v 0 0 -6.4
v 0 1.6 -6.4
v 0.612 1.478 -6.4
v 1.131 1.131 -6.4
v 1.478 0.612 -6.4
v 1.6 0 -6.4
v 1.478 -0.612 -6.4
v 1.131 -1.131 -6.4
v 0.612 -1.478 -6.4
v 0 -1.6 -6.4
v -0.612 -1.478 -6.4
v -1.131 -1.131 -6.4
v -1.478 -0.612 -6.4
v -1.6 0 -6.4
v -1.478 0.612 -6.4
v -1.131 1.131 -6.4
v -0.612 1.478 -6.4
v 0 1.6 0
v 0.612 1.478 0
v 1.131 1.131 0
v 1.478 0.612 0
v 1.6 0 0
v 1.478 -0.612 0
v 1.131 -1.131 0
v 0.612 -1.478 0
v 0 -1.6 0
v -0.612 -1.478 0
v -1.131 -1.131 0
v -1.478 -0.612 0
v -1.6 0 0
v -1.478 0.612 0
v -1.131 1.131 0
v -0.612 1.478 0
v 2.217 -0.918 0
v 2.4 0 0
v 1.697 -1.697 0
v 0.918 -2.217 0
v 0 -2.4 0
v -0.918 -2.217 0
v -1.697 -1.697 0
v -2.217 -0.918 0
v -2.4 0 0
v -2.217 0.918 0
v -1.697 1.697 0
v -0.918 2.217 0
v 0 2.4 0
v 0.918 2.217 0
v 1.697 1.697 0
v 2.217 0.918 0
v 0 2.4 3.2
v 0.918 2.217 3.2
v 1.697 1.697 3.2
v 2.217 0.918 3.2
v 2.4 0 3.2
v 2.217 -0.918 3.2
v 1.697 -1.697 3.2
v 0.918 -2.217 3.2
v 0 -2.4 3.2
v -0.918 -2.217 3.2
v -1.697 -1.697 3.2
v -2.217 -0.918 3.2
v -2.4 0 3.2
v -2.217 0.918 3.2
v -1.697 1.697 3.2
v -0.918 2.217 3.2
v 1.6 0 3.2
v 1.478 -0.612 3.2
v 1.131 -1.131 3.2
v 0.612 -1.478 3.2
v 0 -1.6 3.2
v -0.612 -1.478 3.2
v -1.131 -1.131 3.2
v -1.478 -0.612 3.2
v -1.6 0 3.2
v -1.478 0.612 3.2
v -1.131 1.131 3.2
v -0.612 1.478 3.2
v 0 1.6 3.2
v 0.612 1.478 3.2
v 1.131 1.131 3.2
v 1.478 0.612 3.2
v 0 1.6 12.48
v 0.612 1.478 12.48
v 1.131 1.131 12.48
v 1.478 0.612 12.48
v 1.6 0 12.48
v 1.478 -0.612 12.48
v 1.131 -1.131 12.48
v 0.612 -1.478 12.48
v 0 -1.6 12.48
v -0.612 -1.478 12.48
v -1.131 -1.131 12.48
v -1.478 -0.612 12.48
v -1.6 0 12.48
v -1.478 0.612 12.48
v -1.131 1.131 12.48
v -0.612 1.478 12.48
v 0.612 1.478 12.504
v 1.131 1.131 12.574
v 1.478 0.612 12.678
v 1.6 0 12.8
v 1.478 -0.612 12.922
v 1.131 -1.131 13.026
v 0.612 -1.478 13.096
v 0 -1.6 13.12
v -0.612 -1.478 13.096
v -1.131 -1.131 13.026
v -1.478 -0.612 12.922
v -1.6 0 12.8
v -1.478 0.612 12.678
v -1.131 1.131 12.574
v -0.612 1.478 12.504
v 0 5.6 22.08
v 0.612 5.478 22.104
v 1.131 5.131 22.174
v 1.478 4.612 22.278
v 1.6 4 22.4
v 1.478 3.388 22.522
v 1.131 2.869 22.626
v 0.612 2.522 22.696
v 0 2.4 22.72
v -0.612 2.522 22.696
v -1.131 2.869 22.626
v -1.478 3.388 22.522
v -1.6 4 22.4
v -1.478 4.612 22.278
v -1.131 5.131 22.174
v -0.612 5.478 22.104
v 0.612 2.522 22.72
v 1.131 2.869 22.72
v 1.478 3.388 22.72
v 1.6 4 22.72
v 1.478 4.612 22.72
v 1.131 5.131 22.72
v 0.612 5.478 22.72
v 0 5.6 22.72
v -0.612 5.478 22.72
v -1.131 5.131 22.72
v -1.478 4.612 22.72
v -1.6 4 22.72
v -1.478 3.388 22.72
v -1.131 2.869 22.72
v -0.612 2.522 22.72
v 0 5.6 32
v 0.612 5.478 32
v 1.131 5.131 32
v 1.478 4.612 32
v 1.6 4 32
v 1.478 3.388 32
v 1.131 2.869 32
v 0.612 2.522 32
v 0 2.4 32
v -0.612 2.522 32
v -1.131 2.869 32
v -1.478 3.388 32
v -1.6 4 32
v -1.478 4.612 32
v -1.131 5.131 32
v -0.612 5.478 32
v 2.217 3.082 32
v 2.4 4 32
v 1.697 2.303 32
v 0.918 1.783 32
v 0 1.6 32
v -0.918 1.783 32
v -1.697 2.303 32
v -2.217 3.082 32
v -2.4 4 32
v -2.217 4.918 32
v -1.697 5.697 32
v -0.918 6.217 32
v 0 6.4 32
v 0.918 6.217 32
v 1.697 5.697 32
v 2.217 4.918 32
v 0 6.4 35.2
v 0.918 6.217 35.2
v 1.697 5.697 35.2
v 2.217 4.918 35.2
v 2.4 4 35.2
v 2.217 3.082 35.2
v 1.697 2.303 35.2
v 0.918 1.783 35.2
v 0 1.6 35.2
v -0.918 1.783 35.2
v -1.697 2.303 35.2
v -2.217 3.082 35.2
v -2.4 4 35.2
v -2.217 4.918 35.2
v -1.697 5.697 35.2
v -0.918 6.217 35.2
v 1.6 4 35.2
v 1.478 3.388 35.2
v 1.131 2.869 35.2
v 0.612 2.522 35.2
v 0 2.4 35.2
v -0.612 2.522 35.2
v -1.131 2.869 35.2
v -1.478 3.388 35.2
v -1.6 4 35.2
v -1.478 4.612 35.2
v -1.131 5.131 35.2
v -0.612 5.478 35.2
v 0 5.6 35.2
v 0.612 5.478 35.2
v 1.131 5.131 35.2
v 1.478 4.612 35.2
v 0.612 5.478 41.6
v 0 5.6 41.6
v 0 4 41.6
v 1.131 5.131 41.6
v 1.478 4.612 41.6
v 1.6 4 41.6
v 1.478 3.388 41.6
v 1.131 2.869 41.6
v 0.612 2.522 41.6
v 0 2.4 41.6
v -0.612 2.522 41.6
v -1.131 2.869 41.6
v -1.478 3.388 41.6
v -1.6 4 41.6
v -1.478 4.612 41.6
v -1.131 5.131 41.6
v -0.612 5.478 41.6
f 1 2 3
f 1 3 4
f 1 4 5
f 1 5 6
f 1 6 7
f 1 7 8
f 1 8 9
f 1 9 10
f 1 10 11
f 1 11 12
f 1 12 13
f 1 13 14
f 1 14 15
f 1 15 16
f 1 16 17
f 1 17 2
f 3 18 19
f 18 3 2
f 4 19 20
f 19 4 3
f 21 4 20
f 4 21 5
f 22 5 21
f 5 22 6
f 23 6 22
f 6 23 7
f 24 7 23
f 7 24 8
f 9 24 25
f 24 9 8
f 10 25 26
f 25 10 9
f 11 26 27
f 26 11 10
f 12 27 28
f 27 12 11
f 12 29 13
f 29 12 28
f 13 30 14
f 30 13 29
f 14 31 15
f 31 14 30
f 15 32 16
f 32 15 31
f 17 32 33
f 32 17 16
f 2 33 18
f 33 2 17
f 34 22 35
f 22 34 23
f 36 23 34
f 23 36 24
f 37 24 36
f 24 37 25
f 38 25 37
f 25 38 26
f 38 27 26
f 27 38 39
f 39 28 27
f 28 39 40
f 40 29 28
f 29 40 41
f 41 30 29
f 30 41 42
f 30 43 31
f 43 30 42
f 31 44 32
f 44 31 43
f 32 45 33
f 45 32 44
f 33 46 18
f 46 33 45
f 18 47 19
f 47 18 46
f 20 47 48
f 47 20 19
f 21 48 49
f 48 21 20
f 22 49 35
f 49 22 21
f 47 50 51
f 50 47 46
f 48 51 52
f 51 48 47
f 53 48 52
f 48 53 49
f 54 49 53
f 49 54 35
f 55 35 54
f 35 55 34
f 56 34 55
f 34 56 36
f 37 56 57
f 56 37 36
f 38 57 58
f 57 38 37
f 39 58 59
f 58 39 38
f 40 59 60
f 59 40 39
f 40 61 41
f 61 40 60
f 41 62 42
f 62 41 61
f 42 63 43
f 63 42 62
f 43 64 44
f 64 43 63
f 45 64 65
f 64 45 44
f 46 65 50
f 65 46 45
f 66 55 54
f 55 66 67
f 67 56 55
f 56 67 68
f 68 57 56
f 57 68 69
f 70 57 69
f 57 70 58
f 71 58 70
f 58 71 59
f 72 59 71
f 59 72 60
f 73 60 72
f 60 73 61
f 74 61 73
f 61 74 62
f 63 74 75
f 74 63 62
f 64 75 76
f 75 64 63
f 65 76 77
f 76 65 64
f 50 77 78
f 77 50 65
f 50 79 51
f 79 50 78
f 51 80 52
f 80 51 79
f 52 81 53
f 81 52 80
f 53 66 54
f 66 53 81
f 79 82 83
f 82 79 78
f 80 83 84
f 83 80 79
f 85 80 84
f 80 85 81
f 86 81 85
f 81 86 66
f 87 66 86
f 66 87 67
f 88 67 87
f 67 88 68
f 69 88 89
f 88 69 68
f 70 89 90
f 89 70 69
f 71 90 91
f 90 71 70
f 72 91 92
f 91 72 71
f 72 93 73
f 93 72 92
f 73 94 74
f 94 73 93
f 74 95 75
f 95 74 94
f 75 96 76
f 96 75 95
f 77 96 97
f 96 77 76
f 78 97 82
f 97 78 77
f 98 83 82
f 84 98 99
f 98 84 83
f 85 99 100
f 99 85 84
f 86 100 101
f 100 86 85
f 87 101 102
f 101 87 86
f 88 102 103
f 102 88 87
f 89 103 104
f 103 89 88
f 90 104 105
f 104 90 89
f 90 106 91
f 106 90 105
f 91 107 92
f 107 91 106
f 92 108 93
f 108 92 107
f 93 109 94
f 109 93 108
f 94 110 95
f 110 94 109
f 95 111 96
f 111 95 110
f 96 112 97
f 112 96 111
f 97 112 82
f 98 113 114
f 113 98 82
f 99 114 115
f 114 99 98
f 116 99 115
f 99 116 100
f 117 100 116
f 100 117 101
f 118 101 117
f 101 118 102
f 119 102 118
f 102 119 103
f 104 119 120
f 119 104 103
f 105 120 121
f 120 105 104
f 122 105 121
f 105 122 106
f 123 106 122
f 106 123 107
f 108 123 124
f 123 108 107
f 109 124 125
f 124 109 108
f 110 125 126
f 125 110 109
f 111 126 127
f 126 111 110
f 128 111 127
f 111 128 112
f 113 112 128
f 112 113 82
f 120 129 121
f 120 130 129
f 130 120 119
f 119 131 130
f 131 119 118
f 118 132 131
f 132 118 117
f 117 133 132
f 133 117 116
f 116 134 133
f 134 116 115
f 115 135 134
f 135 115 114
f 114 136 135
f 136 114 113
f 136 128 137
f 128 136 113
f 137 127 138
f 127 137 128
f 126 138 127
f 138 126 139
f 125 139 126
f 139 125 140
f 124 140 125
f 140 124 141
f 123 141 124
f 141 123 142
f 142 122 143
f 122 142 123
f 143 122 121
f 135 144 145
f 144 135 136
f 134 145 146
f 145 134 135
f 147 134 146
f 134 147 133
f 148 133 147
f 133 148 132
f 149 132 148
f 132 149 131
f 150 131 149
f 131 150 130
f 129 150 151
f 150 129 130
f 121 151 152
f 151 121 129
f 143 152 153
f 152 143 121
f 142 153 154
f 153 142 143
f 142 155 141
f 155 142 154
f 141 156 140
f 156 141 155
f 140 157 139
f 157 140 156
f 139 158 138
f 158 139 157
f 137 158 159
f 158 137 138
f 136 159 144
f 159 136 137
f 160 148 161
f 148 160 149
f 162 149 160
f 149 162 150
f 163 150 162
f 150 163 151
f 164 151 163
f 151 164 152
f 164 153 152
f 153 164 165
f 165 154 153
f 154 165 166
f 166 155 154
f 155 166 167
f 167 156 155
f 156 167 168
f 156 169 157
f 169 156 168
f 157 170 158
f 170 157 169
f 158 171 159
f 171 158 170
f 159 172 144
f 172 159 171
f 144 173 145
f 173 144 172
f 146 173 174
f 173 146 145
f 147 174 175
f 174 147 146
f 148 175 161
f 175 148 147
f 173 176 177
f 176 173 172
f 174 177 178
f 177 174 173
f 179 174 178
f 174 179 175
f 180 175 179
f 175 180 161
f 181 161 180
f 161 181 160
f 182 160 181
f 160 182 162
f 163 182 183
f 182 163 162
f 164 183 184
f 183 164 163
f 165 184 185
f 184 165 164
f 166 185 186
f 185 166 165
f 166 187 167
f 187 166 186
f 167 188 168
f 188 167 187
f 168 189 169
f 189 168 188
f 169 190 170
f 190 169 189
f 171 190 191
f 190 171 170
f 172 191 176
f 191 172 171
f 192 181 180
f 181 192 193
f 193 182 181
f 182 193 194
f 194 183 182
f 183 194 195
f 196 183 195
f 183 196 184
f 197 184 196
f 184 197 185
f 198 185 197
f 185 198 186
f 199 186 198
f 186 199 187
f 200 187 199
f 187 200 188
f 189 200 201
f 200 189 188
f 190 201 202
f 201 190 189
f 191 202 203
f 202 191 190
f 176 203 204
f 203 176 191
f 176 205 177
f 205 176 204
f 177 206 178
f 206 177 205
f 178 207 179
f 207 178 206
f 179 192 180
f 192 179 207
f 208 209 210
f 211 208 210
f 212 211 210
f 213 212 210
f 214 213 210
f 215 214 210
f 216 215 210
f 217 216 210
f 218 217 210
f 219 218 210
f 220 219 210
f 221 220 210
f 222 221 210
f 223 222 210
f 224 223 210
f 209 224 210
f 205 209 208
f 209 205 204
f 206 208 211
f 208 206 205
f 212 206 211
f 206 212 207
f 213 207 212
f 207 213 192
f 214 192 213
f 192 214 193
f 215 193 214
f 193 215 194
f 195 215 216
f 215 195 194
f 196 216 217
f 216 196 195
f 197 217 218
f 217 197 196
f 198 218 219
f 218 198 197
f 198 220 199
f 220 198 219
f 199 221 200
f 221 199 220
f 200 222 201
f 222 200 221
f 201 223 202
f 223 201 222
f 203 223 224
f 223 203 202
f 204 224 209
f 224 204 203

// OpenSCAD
// file: ../p/4-4disc.scad
use <../lib.scad>
function ldraw_lib__4_4disc() = [
// 0 Disc 1.0
// 0 Name: 4-4disc.dat
// 0 Author: James Jessiman
// 0 !LDRAW_ORG Primitive UPDATE 2002-02
// 0 !LICENSE Licensed under CC BY 4.0 : see CAreadme.txt
// 
// 0 BFC CERTIFY CCW
  [0,"BFC","CERTIFY"],
  [0,"BFC","CCW"],
// 
// 0 !HISTORY 1998-12-15 [PTadmin] Official Update 1998-10
// 0 !HISTORY 2002-03-23 [sbliss] Added BFC statement
// 0 !HISTORY 2002-04-25 [PTadmin] Official Update 2002-02
// 0 !HISTORY 2007-06-24 [PTadmin] Header formatted for Contributor Agreement
// 0 !HISTORY 2008-07-01 [PTadmin] Official Update 2008-01
// 
// 
// 3 16 0 0 0 1 0 0 0.9239 0 0.3827
  [3,16,0,0,0,1,0,0,0.9239,0,0.3827],
// 3 16 0 0 0 0.9239 0 0.3827 0.7071 0 0.7071
  [3,16,0,0,0,0.9239,0,0.3827,0.7071,0,0.7071],
// 3 16 0 0 0 0.7071 0 0.7071 0.3827 0 0.9239
  [3,16,0,0,0,0.7071,0,0.7071,0.3827,0,0.9239],
// 3 16 0 0 0 0.3827 0 0.9239 0 0 1
  [3,16,0,0,0,0.3827,0,0.9239,0,0,1],
// 3 16 0 0 0 0 0 1 -0.3827 0 0.9239
  [3,16,0,0,0,0,0,1,-0.3827,0,0.9239],
// 3 16 0 0 0 -0.3827 0 0.9239 -0.7071 0 0.7071
  [3,16,0,0,0,-0.3827,0,0.9239,-0.7071,0,0.7071],
// 3 16 0 0 0 -0.7071 0 0.7071 -0.9239 0 0.3827
  [3,16,0,0,0,-0.7071,0,0.7071,-0.9239,0,0.3827],
// 3 16 0 0 0 -0.9239 0 0.3827 -1 0 -0
  [3,16,0,0,0,-0.9239,0,0.3827,-1,0,-0],
// 3 16 0 0 0 -1 0 -0 -0.9239 0 -0.3827
  [3,16,0,0,0,-1,0,-0,-0.9239,0,-0.3827],
// 3 16 0 0 0 -0.9239 0 -0.3827 -0.7071 0 -0.7071
  [3,16,0,0,0,-0.9239,0,-0.3827,-0.7071,0,-0.7071],
// 3 16 0 0 0 -0.7071 0 -0.7071 -0.3827 0 -0.9239
  [3,16,0,0,0,-0.7071,0,-0.7071,-0.3827,0,-0.9239],
// 3 16 0 0 0 -0.3827 0 -0.9239 0 0 -1
  [3,16,0,0,0,-0.3827,0,-0.9239,0,0,-1],
// 3 16 0 0 0 0 0 -1 0.3827 0 -0.9239
  [3,16,0,0,0,0,0,-1,0.3827,0,-0.9239],
// 3 16 0 0 0 0.3827 0 -0.9239 0.7071 0 -0.7071
  [3,16,0,0,0,0.3827,0,-0.9239,0.7071,0,-0.7071],
// 3 16 0 0 0 0.7071 0 -0.7071 0.9239 0 -0.3827
  [3,16,0,0,0,0.7071,0,-0.7071,0.9239,0,-0.3827],
// 3 16 0 0 0 0.9239 0 -0.3827 1 0 0
  [3,16,0,0,0,0.9239,0,-0.3827,1,0,0],
// 0
];
module ldraw_lib__4_4disc(step=0, col=false, unit=2/5, alt=false, line=0.2, solid=!$preview)
    makepoly(ldraw_lib__4_4disc(), step=step, col=col, unit=unit, alt=alt, line=line, solid=solid);
ldraw_lib__4_4disc(line=0.2);
// file: ../p/4-4ring2.scad
use <../lib.scad>
function ldraw_lib__4_4ring2() = [
// 0 Ring  2 x 1.0
// 0 Name: 4-4ring2.dat
// 0 Author: James Jessiman
// 0 !LDRAW_ORG Primitive UPDATE 2009-01
// 0 !LICENSE Licensed under CC BY 4.0 : see CAreadme.txt
// 
// 0 BFC CERTIFY CCW
  [0,"BFC","CERTIFY"],
  [0,"BFC","CCW"],
// 
// 0 !HISTORY 1998-12-15 [PTadmin] Official Update 1998-10
// 0 !HISTORY 2002-04-05 [hafhead] Added BFC statement
// 0 !HISTORY 2002-04-25 [PTadmin] Official Update 2002-02
// 0 !HISTORY 2007-06-24 [PTadmin] Header formatted for Contributor Agreement
// 0 !HISTORY 2008-07-01 [PTadmin] Official Update 2008-01
// 0 !HISTORY 2008-08-26 [cwdee] Switch polygon winding and rename
// 0 !HISTORY 2009-05-02 [PTadmin] Official Update 2009-01
// 
// 
// 4 16 -1.1481 0 2.7717 -0.7654 0 1.8478 0 0 2 0 0 3
  [4,16,-1.1481,0,2.7717,-0.7654,0,1.8478,0,0,2,0,0,3],
// 4 16 -2.1213 0 2.1213 -1.4142 0 1.4142 -0.7654 0 1.8478 -1.1481 0 2.7717
  [4,16,-2.1213,0,2.1213,-1.4142,0,1.4142,-0.7654,0,1.8478,-1.1481,0,2.7717],
// 4 16 -2.7717 0 1.1481 -1.8478 0 0.7654 -1.4142 0 1.4142 -2.1213 0 2.1213
  [4,16,-2.7717,0,1.1481,-1.8478,0,0.7654,-1.4142,0,1.4142,-2.1213,0,2.1213],
// 4 16 -3 0 0 -2 0 0 -1.8478 0 0.7654 -2.7717 0 1.1481
  [4,16,-3,0,0,-2,0,0,-1.8478,0,0.7654,-2.7717,0,1.1481],
// 4 16 -2.7717 0 -1.1481 -1.8478 0 -0.7654 -2 0 0 -3 0 0
  [4,16,-2.7717,0,-1.1481,-1.8478,0,-0.7654,-2,0,0,-3,0,0],
// 4 16 -2.1213 0 -2.1213 -1.4142 0 -1.4142 -1.8478 0 -0.7654 -2.7717 0 -1.1481
  [4,16,-2.1213,0,-2.1213,-1.4142,0,-1.4142,-1.8478,0,-0.7654,-2.7717,0,-1.1481],
// 4 16 -1.1481 0 -2.7717 -0.7654 0 -1.8478 -1.4142 0 -1.4142 -2.1213 0 -2.1213
  [4,16,-1.1481,0,-2.7717,-0.7654,0,-1.8478,-1.4142,0,-1.4142,-2.1213,0,-2.1213],
// 4 16 0 0 -3 0 0 -2 -0.7654 0 -1.8478 -1.1481 0 -2.7717
  [4,16,0,0,-3,0,0,-2,-0.7654,0,-1.8478,-1.1481,0,-2.7717],
// 4 16 1.1481 0 -2.7717 0.7654 0 -1.8478 0 0 -2 0 0 -3
  [4,16,1.1481,0,-2.7717,0.7654,0,-1.8478,0,0,-2,0,0,-3],
// 4 16 2.1213 0 -2.1213 1.4142 0 -1.4142 0.7654 0 -1.8478 1.1481 0 -2.7717
  [4,16,2.1213,0,-2.1213,1.4142,0,-1.4142,0.7654,0,-1.8478,1.1481,0,-2.7717],
// 4 16 2.7717 0 -1.1481 1.8478 0 -0.7654 1.4142 0 -1.4142 2.1213 0 -2.1213
  [4,16,2.7717,0,-1.1481,1.8478,0,-0.7654,1.4142,0,-1.4142,2.1213,0,-2.1213],
// 4 16 3 0 0 2 0 0 1.8478 0 -0.7654 2.7717 0 -1.1481
  [4,16,3,0,0,2,0,0,1.8478,0,-0.7654,2.7717,0,-1.1481],
// 4 16 2.7717 0 1.1481 1.8478 0 0.7654 2 0 0 3 0 0
  [4,16,2.7717,0,1.1481,1.8478,0,0.7654,2,0,0,3,0,0],
// 4 16 2.1213 0 2.1213 1.4142 0 1.4142 1.8478 0 0.7654 2.7717 0 1.1481
  [4,16,2.1213,0,2.1213,1.4142,0,1.4142,1.8478,0,0.7654,2.7717,0,1.1481],
// 4 16 1.1481 0 2.7717 0.7654 0 1.8478 1.4142 0 1.4142 2.1213 0 2.1213
  [4,16,1.1481,0,2.7717,0.7654,0,1.8478,1.4142,0,1.4142,2.1213,0,2.1213],
// 4 16 0 0 3 0 0 2 0.7654 0 1.8478 1.1481 0 2.7717
  [4,16,0,0,3,0,0,2,0.7654,0,1.8478,1.1481,0,2.7717],
// 0
];
module ldraw_lib__4_4ring2(step=0, col=false, unit=2/5, alt=false, line=0.2, solid=!$preview)
    makepoly(ldraw_lib__4_4ring2(), step=step, col=col, unit=unit, alt=alt, line=line, solid=solid);
ldraw_lib__4_4ring2(line=0.2);
// file: ../p/4-4edge.scad
use <../lib.scad>
function ldraw_lib__4_4edge() = [
// 0 Circle 1.0
// 0 Name: 4-4edge.dat
// 0 Author: James Jessiman
// 0 !LDRAW_ORG Primitive UPDATE 2017-01
// 0 !LICENSE Licensed under CC BY 4.0 : see CAreadme.txt
// 
// 0 BFC CERTIFY CCW
  [0,"BFC","CERTIFY"],
  [0,"BFC","CCW"],
// 
// 0 !HISTORY 1998-12-15 [PTadmin] Official Update 1998-10
// 0 !HISTORY 2005-12-28 [PTadmin] Official Update 2005-01
// 0 !HISTORY 2007-06-24 [PTadmin] Header formatted for Contributor Agreement
// 0 !HISTORY 2008-07-01 [PTadmin] Official Update 2008-01
// 0 !HISTORY 2017-01-15 [Steffen] BFCed
// 0 !HISTORY 2017-12-30 [PTadmin] Official Update 2017-01
// 
// 
// 2 24 1 0 0 0.9239 0 0.3827
  [2,24,1,0,0,0.9239,0,0.3827],
// 2 24 0.9239 0 0.3827 0.7071 0 0.7071
  [2,24,0.9239,0,0.3827,0.7071,0,0.7071],
// 2 24 0.7071 0 0.7071 0.3827 0 0.9239
  [2,24,0.7071,0,0.7071,0.3827,0,0.9239],
// 2 24 0.3827 0 0.9239 0 0 1
  [2,24,0.3827,0,0.9239,0,0,1],
// 2 24 0 0 1 -0.3827 0 0.9239
  [2,24,0,0,1,-0.3827,0,0.9239],
// 2 24 -0.3827 0 0.9239 -0.7071 0 0.7071
  [2,24,-0.3827,0,0.9239,-0.7071,0,0.7071],
// 2 24 -0.7071 0 0.7071 -0.9239 0 0.3827
  [2,24,-0.7071,0,0.7071,-0.9239,0,0.3827],
// 2 24 -0.9239 0 0.3827 -1 0 -0
  [2,24,-0.9239,0,0.3827,-1,0,-0],
// 2 24 -1 0 -0 -0.9239 0 -0.3827
  [2,24,-1,0,-0,-0.9239,0,-0.3827],
// 2 24 -0.9239 0 -0.3827 -0.7071 0 -0.7071
  [2,24,-0.9239,0,-0.3827,-0.7071,0,-0.7071],
// 2 24 -0.7071 0 -0.7071 -0.3827 0 -0.9239
  [2,24,-0.7071,0,-0.7071,-0.3827,0,-0.9239],
// 2 24 -0.3827 0 -0.9239 0 0 -1
  [2,24,-0.3827,0,-0.9239,0,0,-1],
// 2 24 0 0 -1 0.3827 0 -0.9239
  [2,24,0,0,-1,0.3827,0,-0.9239],
// 2 24 0.3827 0 -0.9239 0.7071 0 -0.7071
  [2,24,0.3827,0,-0.9239,0.7071,0,-0.7071],
// 2 24 0.7071 0 -0.7071 0.9239 0 -0.3827
  [2,24,0.7071,0,-0.7071,0.9239,0,-0.3827],
// 2 24 0.9239 0 -0.3827 1 0 0
  [2,24,0.9239,0,-0.3827,1,0,0],
];
module ldraw_lib__4_4edge(step=0, col=false, unit=2/5, alt=false, line=0.2, solid=!$preview)
    makepoly(ldraw_lib__4_4edge(), step=step, col=col, unit=unit, alt=alt, line=line, solid=solid);
ldraw_lib__4_4edge(line=0.2);
// file: ../p/4-4cyls.scad
use <../lib.scad>
function ldraw_lib__4_4cyls() = [
// 0 Cylinder Sloped 1.0
// 0 Name: 4-4cyls.dat
// 0 Author: Donald Sutter [technog]
// 0 !LDRAW_ORG Primitive UPDATE 2012-01
// 0 !LICENSE Licensed under CC BY 4.0 : see CAreadme.txt
// 
// 0 BFC CERTIFY CCW
  [0,"BFC","CERTIFY"],
  [0,"BFC","CCW"],
// 
// 0 !HISTORY 2003-08-01 [PTadmin] Official Update 2003-02
// 0 !HISTORY 2007-06-24 [PTadmin] Header formatted for Contributor Agreement
// 0 !HISTORY 2008-07-01 [PTadmin] Official Update 2008-01
// 0 !HISTORY 2012-02-16 [Philo] Changed to CCW
// 0 !HISTORY 2012-03-30 [PTadmin] Official Update 2012-01
// 
// 
// 3 16 0.9239 0.0761 0.3827 0.9239 0 0.3827 1 0 0
  [3,16,0.9239,0.0761,0.3827,0.9239,0,0.3827,1,0,0],
// 5 24 0.9239 0 0.3827 0.9239 0.0761 0.3827 0.7071 0 0.7071 1 0 0
  [5,24,0.9239,0,0.3827,0.9239,0.0761,0.3827,0.7071,0,0.7071,1,0,0],
// 4 16 0.9239 0.0761 0.3827 0.7071 0.2929 0.7071 0.7071 0 0.7071 0.9239 0 0.3827
  [4,16,0.9239,0.0761,0.3827,0.7071,0.2929,0.7071,0.7071,0,0.7071,0.9239,0,0.3827],
// 5 24 0.7071 0 0.7071 0.7071 0.2929 0.7071 0.3827 0 0.9239 0.9239 0 0.3827
  [5,24,0.7071,0,0.7071,0.7071,0.2929,0.7071,0.3827,0,0.9239,0.9239,0,0.3827],
// 4 16 0.7071 0.2929 0.7071 0.3827 0.6173 0.9239 0.3827 0 0.9239 0.7071 0 0.7071
  [4,16,0.7071,0.2929,0.7071,0.3827,0.6173,0.9239,0.3827,0,0.9239,0.7071,0,0.7071],
// 5 24 0.3827 0 0.9239 0.3827 0.6173 0.9239 0 0 1 0.7071 0 0.7071
  [5,24,0.3827,0,0.9239,0.3827,0.6173,0.9239,0,0,1,0.7071,0,0.7071],
// 4 16 0.3827 0.6173 0.9239 0 1 1 0 0 1 0.3827 0 0.9239
  [4,16,0.3827,0.6173,0.9239,0,1,1,0,0,1,0.3827,0,0.9239],
// 5 24 0 0 1 0 1 1 -0.3827 0 0.9239 0.3827 0 0.9239
  [5,24,0,0,1,0,1,1,-0.3827,0,0.9239,0.3827,0,0.9239],
// 4 16 0 1 1 -0.3827 1.3827 0.9239 -0.3827 0 0.9239 0 0 1
  [4,16,0,1,1,-0.3827,1.3827,0.9239,-0.3827,0,0.9239,0,0,1],
// 5 24 -0.3827 0 0.9239 -0.3827 1.3827 0.9239 -0.7071 0 0.7071 0 0 1
  [5,24,-0.3827,0,0.9239,-0.3827,1.3827,0.9239,-0.7071,0,0.7071,0,0,1],
// 4 16 -0.3827 1.3827 0.9239 -0.7071 1.7071 0.7071 -0.7071 0 0.7071 -0.3827 0 0.9239
  [4,16,-0.3827,1.3827,0.9239,-0.7071,1.7071,0.7071,-0.7071,0,0.7071,-0.3827,0,0.9239],
// 5 24 -0.7071 0 0.7071 -0.7071 1.7071 0.7071 -0.9239 0 0.3827 -0.3827 0 0.9239
  [5,24,-0.7071,0,0.7071,-0.7071,1.7071,0.7071,-0.9239,0,0.3827,-0.3827,0,0.9239],
// 4 16 -0.7071 1.7071 0.7071 -0.9239 1.9239 0.3827 -0.9239 0 0.3827 -0.7071 0 0.7071
  [4,16,-0.7071,1.7071,0.7071,-0.9239,1.9239,0.3827,-0.9239,0,0.3827,-0.7071,0,0.7071],
// 5 24 -0.9239 0 0.3827 -0.9239 1.9239 0.3827 -1 0 0 -0.7071 0 0.7071
  [5,24,-0.9239,0,0.3827,-0.9239,1.9239,0.3827,-1,0,0,-0.7071,0,0.7071],
// 4 16 -0.9239 1.9239 0.3827 -1 2 0 -1 0 0 -0.9239 0 0.3827
  [4,16,-0.9239,1.9239,0.3827,-1,2,0,-1,0,0,-0.9239,0,0.3827],
// 5 24 -1 0 0 -1 2 0 -0.9239 0 -0.3827 -0.9239 0 0.3827
  [5,24,-1,0,0,-1,2,0,-0.9239,0,-0.3827,-0.9239,0,0.3827],
// 4 16 -1 2 0 -0.9239 1.9239 -0.3827 -0.9239 0 -0.3827 -1 0 0
  [4,16,-1,2,0,-0.9239,1.9239,-0.3827,-0.9239,0,-0.3827,-1,0,0],
// 5 24 -0.9239 0 -0.3827 -0.9239 1.9239 -0.3827 -1 0 0 -0.7071 0 -0.7071
  [5,24,-0.9239,0,-0.3827,-0.9239,1.9239,-0.3827,-1,0,0,-0.7071,0,-0.7071],
// 4 16 -0.9239 1.9239 -0.3827 -0.7071 1.7071 -0.7071 -0.7071 0 -0.7071 -0.9239 0 -0.3827
  [4,16,-0.9239,1.9239,-0.3827,-0.7071,1.7071,-0.7071,-0.7071,0,-0.7071,-0.9239,0,-0.3827],
// 5 24 -0.7071 0 -0.7071 -0.7071 1.7071 -0.7071 -0.9239 0 -0.3827 -0.3827 0 -0.9239
  [5,24,-0.7071,0,-0.7071,-0.7071,1.7071,-0.7071,-0.9239,0,-0.3827,-0.3827,0,-0.9239],
// 4 16 -0.7071 1.7071 -0.7071 -0.3827 1.3827 -0.9239 -0.3827 0 -0.9239 -0.7071 0 -0.7071
  [4,16,-0.7071,1.7071,-0.7071,-0.3827,1.3827,-0.9239,-0.3827,0,-0.9239,-0.7071,0,-0.7071],
// 5 24 -0.3827 0 -0.9239 -0.3827 1.3827 -0.9239 -0.7071 0 -0.7071 0 0 -1
  [5,24,-0.3827,0,-0.9239,-0.3827,1.3827,-0.9239,-0.7071,0,-0.7071,0,0,-1],
// 4 16 -0.3827 1.3827 -0.9239 0 1 -1 0 0 -1 -0.3827 0 -0.9239
  [4,16,-0.3827,1.3827,-0.9239,0,1,-1,0,0,-1,-0.3827,0,-0.9239],
// 5 24 0 0 -1 0 1 -1 -0.3827 0 -0.9239 0.3827 0 -0.9239
  [5,24,0,0,-1,0,1,-1,-0.3827,0,-0.9239,0.3827,0,-0.9239],
// 4 16 0 1 -1 0.3827 0.6173 -0.9239 0.3827 0 -0.9239 0 0 -1
  [4,16,0,1,-1,0.3827,0.6173,-0.9239,0.3827,0,-0.9239,0,0,-1],
// 5 24 0.3827 0 -0.9239 0.3827 0.6173 -0.9239 0 0 -1 0.7071 0 -0.7071
  [5,24,0.3827,0,-0.9239,0.3827,0.6173,-0.9239,0,0,-1,0.7071,0,-0.7071],
// 4 16 0.3827 0.6173 -0.9239 0.7071 0.2929 -0.7071 0.7071 0 -0.7071 0.3827 0 -0.9239
  [4,16,0.3827,0.6173,-0.9239,0.7071,0.2929,-0.7071,0.7071,0,-0.7071,0.3827,0,-0.9239],
// 5 24 0.7071 0 -0.7071 0.7071 0.2929 -0.7071 0.3827 0 -0.9239 0.9239 0 -0.3827
  [5,24,0.7071,0,-0.7071,0.7071,0.2929,-0.7071,0.3827,0,-0.9239,0.9239,0,-0.3827],
// 4 16 0.7071 0.2929 -0.7071 0.9239 0.0761 -0.3827 0.9239 0 -0.3827 0.7071 0 -0.7071
  [4,16,0.7071,0.2929,-0.7071,0.9239,0.0761,-0.3827,0.9239,0,-0.3827,0.7071,0,-0.7071],
// 5 24 0.9239 0 -0.3827 0.9239 0.0761 -0.3827 0.7071 0 -0.7071 1 0 0
  [5,24,0.9239,0,-0.3827,0.9239,0.0761,-0.3827,0.7071,0,-0.7071,1,0,0],
// 3 16 0.9239 0 -0.3827 0.9239 0.0761 -0.3827 1 0 0
  [3,16,0.9239,0,-0.3827,0.9239,0.0761,-0.3827,1,0,0],
];
module ldraw_lib__4_4cyls(step=0, col=false, unit=2/5, alt=false, line=0.2, solid=!$preview)
    makepoly(ldraw_lib__4_4cyls(), step=step, col=col, unit=unit, alt=alt, line=line, solid=solid);
ldraw_lib__4_4cyls(line=0.2);
// file: ../p/4-4cylo.scad
use <../lib.scad>
use <4-4cyli.scad>
use <4-4edge.scad>
function ldraw_lib__4_4cylo() = [
// 0 Cylinder Open 1.0
// 0 Name: 4-4cylo.dat
// 0 Author: Mark Kennedy [mkennedy]
// 0 !LDRAW_ORG Primitive UPDATE 2010-01
// 0 !LICENSE Licensed under CC BY 4.0 : see CAreadme.txt
// 
// 0 BFC CERTIFY CCW
  [0,"BFC","CERTIFY"],
  [0,"BFC","CCW"],
// 
// 0 !HISTORY 2010-04-05 [PTadmin] Official Update 2010-01
// 
// 
// 1 16 0 0 0 1 0 0 0 1 0 0 0 1 4-4edge.dat
  [1,16,0,0,0,1,0,0,0,1,0,0,0,1, ldraw_lib__4_4edge()],
// 1 16 0 1 0 1 0 0 0 1 0 0 0 1 4-4edge.dat
  [1,16,0,1,0,1,0,0,0,1,0,0,0,1, ldraw_lib__4_4edge()],
// 1 16 0 0 0 1 0 0 0 1 0 0 0 1 4-4cyli.dat
  [1,16,0,0,0,1,0,0,0,1,0,0,0,1, ldraw_lib__4_4cyli()],
// 0
];
module ldraw_lib__4_4cylo(step=0, col=false, unit=2/5, alt=false, line=0.2, solid=!$preview)
    makepoly(ldraw_lib__4_4cylo(), step=step, col=col, unit=unit, alt=alt, line=line, solid=solid);
ldraw_lib__4_4cylo(line=0.2);
// file: ../p/4-4cyli.scad
use <../lib.scad>
function ldraw_lib__4_4cyli() = [
// 0 Cylinder 1.0
// 0 Name: 4-4cyli.dat
// 0 Author: James Jessiman
// 0 !LDRAW_ORG Primitive UPDATE 2005-01
// 0 !LICENSE Licensed under CC BY 4.0 : see CAreadme.txt
// 
// 0 BFC CERTIFY CCW
  [0,"BFC","CERTIFY"],
  [0,"BFC","CCW"],
// 
// 0 !HISTORY 1998-12-15 [PTadmin] Official Update 1998-10
// 0 !HISTORY 2002-03-23 [sbliss] Added BFC statement; merged headers from files in distributions LDraw 0.27 and Complete.
// 0 !HISTORY 2002-04-25 [PTadmin] Official Update 2002-02
// 0 !HISTORY 2004-12-14 [guyvivan] BFC CCW
// 0 !HISTORY 2005-12-28 [PTadmin] Official Update 2005-01
// 0 !HISTORY 2007-06-24 [PTadmin] Header formatted for Contributor Agreement
// 0 !HISTORY 2008-07-01 [PTadmin] Official Update 2008-01
// 
// 
// 4 16 1 1 0 0.9239 1 0.3827 0.9239 0 0.3827 1 0 0
  [4,16,1,1,0,0.9239,1,0.3827,0.9239,0,0.3827,1,0,0],
// 5 24 1 0 0 1 1 0 0.9239 0 0.3827 0.9239 0 -0.3827
  [5,24,1,0,0,1,1,0,0.9239,0,0.3827,0.9239,0,-0.3827],
// 4 16 0.9239 1 0.3827 0.7071 1 0.7071 0.7071 0 0.7071 0.9239 0 0.3827
  [4,16,0.9239,1,0.3827,0.7071,1,0.7071,0.7071,0,0.7071,0.9239,0,0.3827],
// 5 24 0.9239 0 0.3827 0.9239 1 0.3827 0.7071 0 0.7071 1 0 0
  [5,24,0.9239,0,0.3827,0.9239,1,0.3827,0.7071,0,0.7071,1,0,0],
// 4 16 0.7071 1 0.7071 0.3827 1 0.9239 0.3827 0 0.9239 0.7071 0 0.7071
  [4,16,0.7071,1,0.7071,0.3827,1,0.9239,0.3827,0,0.9239,0.7071,0,0.7071],
// 5 24 0.7071 0 0.7071 0.7071 1 0.7071 0.3827 0 0.9239 0.9239 0 0.3827
  [5,24,0.7071,0,0.7071,0.7071,1,0.7071,0.3827,0,0.9239,0.9239,0,0.3827],
// 4 16 0.3827 1 0.9239 0 1 1 0 0 1 0.3827 0 0.9239
  [4,16,0.3827,1,0.9239,0,1,1,0,0,1,0.3827,0,0.9239],
// 5 24 0.3827 0 0.9239 0.3827 1 0.9239 0 0 1 0.7071 0 0.7071
  [5,24,0.3827,0,0.9239,0.3827,1,0.9239,0,0,1,0.7071,0,0.7071],
// 4 16 0 1 1 -0.3827 1 0.9239 -0.3827 0 0.9239 0 0 1
  [4,16,0,1,1,-0.3827,1,0.9239,-0.3827,0,0.9239,0,0,1],
// 5 24 0 0 1 0 1 1 -0.3827 0 0.9239 0.3827 0 0.9239
  [5,24,0,0,1,0,1,1,-0.3827,0,0.9239,0.3827,0,0.9239],
// 4 16 -0.3827 1 0.9239 -0.7071 1 0.7071 -0.7071 0 0.7071 -0.3827 0 0.9239
  [4,16,-0.3827,1,0.9239,-0.7071,1,0.7071,-0.7071,0,0.7071,-0.3827,0,0.9239],
// 5 24 -0.3827 0 0.9239 -0.3827 1 0.9239 -0.7071 0 0.7071 0 0 1
  [5,24,-0.3827,0,0.9239,-0.3827,1,0.9239,-0.7071,0,0.7071,0,0,1],
// 4 16 -0.7071 1 0.7071 -0.9239 1 0.3827 -0.9239 0 0.3827 -0.7071 0 0.7071
  [4,16,-0.7071,1,0.7071,-0.9239,1,0.3827,-0.9239,0,0.3827,-0.7071,0,0.7071],
// 5 24 -0.7071 0 0.7071 -0.7071 1 0.7071 -0.9239 0 0.3827 -0.3827 0 0.9239
  [5,24,-0.7071,0,0.7071,-0.7071,1,0.7071,-0.9239,0,0.3827,-0.3827,0,0.9239],
// 4 16 -0.9239 1 0.3827 -1 1 0 -1 0 0 -0.9239 0 0.3827
  [4,16,-0.9239,1,0.3827,-1,1,0,-1,0,0,-0.9239,0,0.3827],
// 5 24 -0.9239 0 0.3827 -0.9239 1 0.3827 -1 0 0 -0.7071 0 0.7071
  [5,24,-0.9239,0,0.3827,-0.9239,1,0.3827,-1,0,0,-0.7071,0,0.7071],
// 4 16 -1 1 0 -0.9239 1 -0.3827 -0.9239 0 -0.3827 -1 0 0
  [4,16,-1,1,0,-0.9239,1,-0.3827,-0.9239,0,-0.3827,-1,0,0],
// 5 24 -1 0 0 -1 1 0 -0.9239 0 -0.3827 -0.9239 0 0.3827
  [5,24,-1,0,0,-1,1,0,-0.9239,0,-0.3827,-0.9239,0,0.3827],
// 4 16 -0.9239 1 -0.3827 -0.7071 1 -0.7071 -0.7071 0 -0.7071 -0.9239 0 -0.3827
  [4,16,-0.9239,1,-0.3827,-0.7071,1,-0.7071,-0.7071,0,-0.7071,-0.9239,0,-0.3827],
// 5 24 -0.9239 0 -0.3827 -0.9239 1 -0.3827 -0.7071 0 -0.7071 -1 0 0
  [5,24,-0.9239,0,-0.3827,-0.9239,1,-0.3827,-0.7071,0,-0.7071,-1,0,0],
// 4 16 -0.7071 1 -0.7071 -0.3827 1 -0.9239 -0.3827 0 -0.9239 -0.7071 0 -0.7071
  [4,16,-0.7071,1,-0.7071,-0.3827,1,-0.9239,-0.3827,0,-0.9239,-0.7071,0,-0.7071],
// 5 24 -0.7071 0 -0.7071 -0.7071 1 -0.7071 -0.3827 0 -0.9239 -0.9239 0 -0.3827
  [5,24,-0.7071,0,-0.7071,-0.7071,1,-0.7071,-0.3827,0,-0.9239,-0.9239,0,-0.3827],
// 4 16 -0.3827 1 -0.9239 0 1 -1 0 0 -1 -0.3827 0 -0.9239
  [4,16,-0.3827,1,-0.9239,0,1,-1,0,0,-1,-0.3827,0,-0.9239],
// 5 24 -0.3827 0 -0.9239 -0.3827 1 -0.9239 0 0 -1 -0.7071 0 -0.7071
  [5,24,-0.3827,0,-0.9239,-0.3827,1,-0.9239,0,0,-1,-0.7071,0,-0.7071],
// 4 16 0 1 -1 0.3827 1 -0.9239 0.3827 0 -0.9239 0 0 -1
  [4,16,0,1,-1,0.3827,1,-0.9239,0.3827,0,-0.9239,0,0,-1],
// 5 24 0 0 -1 0 1 -1 0.3827 0 -0.9239 -0.3827 0 -0.9239
  [5,24,0,0,-1,0,1,-1,0.3827,0,-0.9239,-0.3827,0,-0.9239],
// 4 16 0.3827 1 -0.9239 0.7071 1 -0.7071 0.7071 0 -0.7071 0.3827 0 -0.9239
  [4,16,0.3827,1,-0.9239,0.7071,1,-0.7071,0.7071,0,-0.7071,0.3827,0,-0.9239],
// 5 24 0.3827 0 -0.9239 0.3827 1 -0.9239 0.7071 0 -0.7071 0 0 -1
  [5,24,0.3827,0,-0.9239,0.3827,1,-0.9239,0.7071,0,-0.7071,0,0,-1],
// 4 16 0.7071 1 -0.7071 0.9239 1 -0.3827 0.9239 0 -0.3827 0.7071 0 -0.7071
  [4,16,0.7071,1,-0.7071,0.9239,1,-0.3827,0.9239,0,-0.3827,0.7071,0,-0.7071],
// 5 24 0.7071 0 -0.7071 0.7071 1 -0.7071 0.9239 0 -0.3827 0.3827 0 -0.9239
  [5,24,0.7071,0,-0.7071,0.7071,1,-0.7071,0.9239,0,-0.3827,0.3827,0,-0.9239],
// 4 16 0.9239 1 -0.3827 1 1 0 1 0 0 0.9239 0 -0.3827
  [4,16,0.9239,1,-0.3827,1,1,0,1,0,0,0.9239,0,-0.3827],
// 5 24 0.9239 0 -0.3827 0.9239 1 -0.3827 1 0 0 0.7071 0 -0.7071
  [5,24,0.9239,0,-0.3827,0.9239,1,-0.3827,1,0,0,0.7071,0,-0.7071],
// 0
];
module ldraw_lib__4_4cyli(step=0, col=false, unit=2/5, alt=false, line=0.2, solid=!$preview)
    makepoly(ldraw_lib__4_4cyli(), step=step, col=col, unit=unit, alt=alt, line=line, solid=solid);
ldraw_lib__4_4cyli(line=0.2);
// file: ../p/4-4cylc.scad
use <../lib.scad>
use <4-4cyli.scad>
use <4-4disc.scad>
use <4-4edge.scad>
function ldraw_lib__4_4cylc() = [
// 0 Cylinder Closed 1.0
// 0 Name: 4-4cylc.dat
// 0 Author: Alex Taylor [anathema]
// 0 !LDRAW_ORG Primitive UPDATE 2009-02
// 0 !LICENSE Licensed under CC BY 4.0 : see CAreadme.txt
// 
// 0 BFC CERTIFY CCW
  [0,"BFC","CERTIFY"],
  [0,"BFC","CCW"],
// 
// 0 !HISTORY 2008-12-29 [cwdee] Removed one disc
// 0 !HISTORY 2009-09-03 [PTadmin] Official Update 2009-02
// 
// 
// 1 16 0 0 0 1 0 0 0 1 0 0 0 1 4-4edge.dat
  [1,16,0,0,0,1,0,0,0,1,0,0,0,1, ldraw_lib__4_4edge()],
// 1 16 0 1 0 1 0 0 0 1 0 0 0 1 4-4edge.dat
  [1,16,0,1,0,1,0,0,0,1,0,0,0,1, ldraw_lib__4_4edge()],
// 1 16 0 0 0 1 0 0 0 1 0 0 0 1 4-4disc.dat
  [1,16,0,0,0,1,0,0,0,1,0,0,0,1, ldraw_lib__4_4disc()],
// 1 16 0 0 0 1 0 0 0 1 0 0 0 1 4-4cyli.dat
  [1,16,0,0,0,1,0,0,0,1,0,0,0,1, ldraw_lib__4_4cyli()],
// 0
];
module ldraw_lib__4_4cylc(step=0, col=false, unit=2/5, alt=false, line=0.2, solid=!$preview)
    makepoly(ldraw_lib__4_4cylc(), step=step, col=col, unit=unit, alt=alt, line=line, solid=solid);
ldraw_lib__4_4cylc(line=0.2);
// main file
use <../lib.scad>
use <../p/4-4cylc.scad>
use <../p/4-4cyli.scad>
use <../p/4-4cylo.scad>
use <../p/4-4cyls.scad>
use <../p/4-4edge.scad>
use <../p/4-4ring2.scad>
function ldraw_lib__7078() = [
// 0 Bar  6L with Stop Rings Double Bent
// 0 Name: 7078.dat
// 0 Author: Philippe Hurbain [Philo]
// 0 !LDRAW_ORG Part UPDATE 2025-07
// 0 !LICENSE Licensed under CC BY 4.0 : see CAreadme.txt
// 
// 0 !HELP Rotated middle section
// 0 !HELP 1 16 0 -32.73846 0.30769 0 0 4 1.53846 -22.52308 0 3.69231 9.38462 0 4-4cyli.dat
// 
// 0 BFC CERTIFY CCW
  [0,"BFC","CERTIFY"],
  [0,"BFC","CCW"],
// 
// 0 !HISTORY 2025-07-27 [OrionP] Official Update 2025-07
// 
// 1 16 0 16 0 0 0 4 0 -16 0 4 0 0 4-4cylc.dat
  [1,16,0,16,0,0,0,4,0,-16,0,4,0,0, ldraw_lib__4_4cylc()],
// 1 16 0 0 0 0 0 2 0 -1 0 2 0 0 4-4ring2.dat
  [1,16,0,0,0,0,0,2,0,-1,0,2,0,0, ldraw_lib__4_4ring2()],
// 1 16 0 -8 0 0 0 6 0 8 0 6 0 0 4-4cylo.dat
  [1,16,0,-8,0,0,0,6,0,8,0,6,0,0, ldraw_lib__4_4cylo()],
// 1 16 0 -8 0 0 0 2 0 1 0 2 0 0 4-4ring2.dat
  [1,16,0,-8,0,0,0,2,0,1,0,2,0,0, ldraw_lib__4_4ring2()],
// 1 16 0 -8 0 0 0 4 0 1 0 4 0 0 4-4edge.dat
  [1,16,0,-8,0,0,0,4,0,1,0,4,0,0, ldraw_lib__4_4edge()],
// 1 16 0 -8 0 0 0 4 0 -23.2 0 4 0 0 4-4cyli.dat
  [1,16,0,-8,0,0,0,4,0,-23.2,0,4,0,0, ldraw_lib__4_4cyli()],
// 1 16 0 -31.2 0 0 0 4 0 -0.8 0 4 0 0 4-4cyls.dat
  [1,16,0,-31.2,0,0,0,4,0,-0.8,0,4,0,0, ldraw_lib__4_4cyls()],
// 1 16 0 -32 0 0 0 4 0.8 -24 0 4 10 0 4-4cylo.dat
  [1,16,0,-32,0,0,0,4,0.8,-24,0,4,10,0, ldraw_lib__4_4cylo()],
// 1 16 0 -56.8 10 0 0 4 0 0.8 0 -4 0 0 4-4cyls.dat
  [1,16,0,-56.8,10,0,0,4,0,0.8,0,-4,0,0, ldraw_lib__4_4cyls()],
// 1 16 0 -80 10 0 0 4 0 23.2 0 4 0 0 4-4cyli.dat
  [1,16,0,-80,10,0,0,4,0,23.2,0,4,0,0, ldraw_lib__4_4cyli()],
// 1 16 0 -80 10 0 0 4 0 1 0 4 0 0 4-4edge.dat
  [1,16,0,-80,10,0,0,4,0,1,0,4,0,0, ldraw_lib__4_4edge()],
// 1 16 0 -80 10 0 0 2 0 -1 0 2 0 0 4-4ring2.dat
  [1,16,0,-80,10,0,0,2,0,-1,0,2,0,0, ldraw_lib__4_4ring2()],
// 1 16 0 -80 10 0 0 6 0 -8 0 6 0 0 4-4cylo.dat
  [1,16,0,-80,10,0,0,6,0,-8,0,6,0,0, ldraw_lib__4_4cylo()],
// 1 16 0 -88 10 0 0 2 0 1 0 2 0 0 4-4ring2.dat
  [1,16,0,-88,10,0,0,2,0,1,0,2,0,0, ldraw_lib__4_4ring2()],
// 1 16 0 -104 10 0 0 4 0 16 0 4 0 0 4-4cylc.dat
  [1,16,0,-104,10,0,0,4,0,16,0,4,0,0, ldraw_lib__4_4cylc()],
];
module ldraw_lib__7078(step=0, col=false, unit=2/5, alt=false, line=0.2, solid=!$preview)
    makepoly(ldraw_lib__7078(), step=step, col=col, unit=unit, alt=alt, line=line, solid=solid);
ldraw_lib__7078(line=0.2);
